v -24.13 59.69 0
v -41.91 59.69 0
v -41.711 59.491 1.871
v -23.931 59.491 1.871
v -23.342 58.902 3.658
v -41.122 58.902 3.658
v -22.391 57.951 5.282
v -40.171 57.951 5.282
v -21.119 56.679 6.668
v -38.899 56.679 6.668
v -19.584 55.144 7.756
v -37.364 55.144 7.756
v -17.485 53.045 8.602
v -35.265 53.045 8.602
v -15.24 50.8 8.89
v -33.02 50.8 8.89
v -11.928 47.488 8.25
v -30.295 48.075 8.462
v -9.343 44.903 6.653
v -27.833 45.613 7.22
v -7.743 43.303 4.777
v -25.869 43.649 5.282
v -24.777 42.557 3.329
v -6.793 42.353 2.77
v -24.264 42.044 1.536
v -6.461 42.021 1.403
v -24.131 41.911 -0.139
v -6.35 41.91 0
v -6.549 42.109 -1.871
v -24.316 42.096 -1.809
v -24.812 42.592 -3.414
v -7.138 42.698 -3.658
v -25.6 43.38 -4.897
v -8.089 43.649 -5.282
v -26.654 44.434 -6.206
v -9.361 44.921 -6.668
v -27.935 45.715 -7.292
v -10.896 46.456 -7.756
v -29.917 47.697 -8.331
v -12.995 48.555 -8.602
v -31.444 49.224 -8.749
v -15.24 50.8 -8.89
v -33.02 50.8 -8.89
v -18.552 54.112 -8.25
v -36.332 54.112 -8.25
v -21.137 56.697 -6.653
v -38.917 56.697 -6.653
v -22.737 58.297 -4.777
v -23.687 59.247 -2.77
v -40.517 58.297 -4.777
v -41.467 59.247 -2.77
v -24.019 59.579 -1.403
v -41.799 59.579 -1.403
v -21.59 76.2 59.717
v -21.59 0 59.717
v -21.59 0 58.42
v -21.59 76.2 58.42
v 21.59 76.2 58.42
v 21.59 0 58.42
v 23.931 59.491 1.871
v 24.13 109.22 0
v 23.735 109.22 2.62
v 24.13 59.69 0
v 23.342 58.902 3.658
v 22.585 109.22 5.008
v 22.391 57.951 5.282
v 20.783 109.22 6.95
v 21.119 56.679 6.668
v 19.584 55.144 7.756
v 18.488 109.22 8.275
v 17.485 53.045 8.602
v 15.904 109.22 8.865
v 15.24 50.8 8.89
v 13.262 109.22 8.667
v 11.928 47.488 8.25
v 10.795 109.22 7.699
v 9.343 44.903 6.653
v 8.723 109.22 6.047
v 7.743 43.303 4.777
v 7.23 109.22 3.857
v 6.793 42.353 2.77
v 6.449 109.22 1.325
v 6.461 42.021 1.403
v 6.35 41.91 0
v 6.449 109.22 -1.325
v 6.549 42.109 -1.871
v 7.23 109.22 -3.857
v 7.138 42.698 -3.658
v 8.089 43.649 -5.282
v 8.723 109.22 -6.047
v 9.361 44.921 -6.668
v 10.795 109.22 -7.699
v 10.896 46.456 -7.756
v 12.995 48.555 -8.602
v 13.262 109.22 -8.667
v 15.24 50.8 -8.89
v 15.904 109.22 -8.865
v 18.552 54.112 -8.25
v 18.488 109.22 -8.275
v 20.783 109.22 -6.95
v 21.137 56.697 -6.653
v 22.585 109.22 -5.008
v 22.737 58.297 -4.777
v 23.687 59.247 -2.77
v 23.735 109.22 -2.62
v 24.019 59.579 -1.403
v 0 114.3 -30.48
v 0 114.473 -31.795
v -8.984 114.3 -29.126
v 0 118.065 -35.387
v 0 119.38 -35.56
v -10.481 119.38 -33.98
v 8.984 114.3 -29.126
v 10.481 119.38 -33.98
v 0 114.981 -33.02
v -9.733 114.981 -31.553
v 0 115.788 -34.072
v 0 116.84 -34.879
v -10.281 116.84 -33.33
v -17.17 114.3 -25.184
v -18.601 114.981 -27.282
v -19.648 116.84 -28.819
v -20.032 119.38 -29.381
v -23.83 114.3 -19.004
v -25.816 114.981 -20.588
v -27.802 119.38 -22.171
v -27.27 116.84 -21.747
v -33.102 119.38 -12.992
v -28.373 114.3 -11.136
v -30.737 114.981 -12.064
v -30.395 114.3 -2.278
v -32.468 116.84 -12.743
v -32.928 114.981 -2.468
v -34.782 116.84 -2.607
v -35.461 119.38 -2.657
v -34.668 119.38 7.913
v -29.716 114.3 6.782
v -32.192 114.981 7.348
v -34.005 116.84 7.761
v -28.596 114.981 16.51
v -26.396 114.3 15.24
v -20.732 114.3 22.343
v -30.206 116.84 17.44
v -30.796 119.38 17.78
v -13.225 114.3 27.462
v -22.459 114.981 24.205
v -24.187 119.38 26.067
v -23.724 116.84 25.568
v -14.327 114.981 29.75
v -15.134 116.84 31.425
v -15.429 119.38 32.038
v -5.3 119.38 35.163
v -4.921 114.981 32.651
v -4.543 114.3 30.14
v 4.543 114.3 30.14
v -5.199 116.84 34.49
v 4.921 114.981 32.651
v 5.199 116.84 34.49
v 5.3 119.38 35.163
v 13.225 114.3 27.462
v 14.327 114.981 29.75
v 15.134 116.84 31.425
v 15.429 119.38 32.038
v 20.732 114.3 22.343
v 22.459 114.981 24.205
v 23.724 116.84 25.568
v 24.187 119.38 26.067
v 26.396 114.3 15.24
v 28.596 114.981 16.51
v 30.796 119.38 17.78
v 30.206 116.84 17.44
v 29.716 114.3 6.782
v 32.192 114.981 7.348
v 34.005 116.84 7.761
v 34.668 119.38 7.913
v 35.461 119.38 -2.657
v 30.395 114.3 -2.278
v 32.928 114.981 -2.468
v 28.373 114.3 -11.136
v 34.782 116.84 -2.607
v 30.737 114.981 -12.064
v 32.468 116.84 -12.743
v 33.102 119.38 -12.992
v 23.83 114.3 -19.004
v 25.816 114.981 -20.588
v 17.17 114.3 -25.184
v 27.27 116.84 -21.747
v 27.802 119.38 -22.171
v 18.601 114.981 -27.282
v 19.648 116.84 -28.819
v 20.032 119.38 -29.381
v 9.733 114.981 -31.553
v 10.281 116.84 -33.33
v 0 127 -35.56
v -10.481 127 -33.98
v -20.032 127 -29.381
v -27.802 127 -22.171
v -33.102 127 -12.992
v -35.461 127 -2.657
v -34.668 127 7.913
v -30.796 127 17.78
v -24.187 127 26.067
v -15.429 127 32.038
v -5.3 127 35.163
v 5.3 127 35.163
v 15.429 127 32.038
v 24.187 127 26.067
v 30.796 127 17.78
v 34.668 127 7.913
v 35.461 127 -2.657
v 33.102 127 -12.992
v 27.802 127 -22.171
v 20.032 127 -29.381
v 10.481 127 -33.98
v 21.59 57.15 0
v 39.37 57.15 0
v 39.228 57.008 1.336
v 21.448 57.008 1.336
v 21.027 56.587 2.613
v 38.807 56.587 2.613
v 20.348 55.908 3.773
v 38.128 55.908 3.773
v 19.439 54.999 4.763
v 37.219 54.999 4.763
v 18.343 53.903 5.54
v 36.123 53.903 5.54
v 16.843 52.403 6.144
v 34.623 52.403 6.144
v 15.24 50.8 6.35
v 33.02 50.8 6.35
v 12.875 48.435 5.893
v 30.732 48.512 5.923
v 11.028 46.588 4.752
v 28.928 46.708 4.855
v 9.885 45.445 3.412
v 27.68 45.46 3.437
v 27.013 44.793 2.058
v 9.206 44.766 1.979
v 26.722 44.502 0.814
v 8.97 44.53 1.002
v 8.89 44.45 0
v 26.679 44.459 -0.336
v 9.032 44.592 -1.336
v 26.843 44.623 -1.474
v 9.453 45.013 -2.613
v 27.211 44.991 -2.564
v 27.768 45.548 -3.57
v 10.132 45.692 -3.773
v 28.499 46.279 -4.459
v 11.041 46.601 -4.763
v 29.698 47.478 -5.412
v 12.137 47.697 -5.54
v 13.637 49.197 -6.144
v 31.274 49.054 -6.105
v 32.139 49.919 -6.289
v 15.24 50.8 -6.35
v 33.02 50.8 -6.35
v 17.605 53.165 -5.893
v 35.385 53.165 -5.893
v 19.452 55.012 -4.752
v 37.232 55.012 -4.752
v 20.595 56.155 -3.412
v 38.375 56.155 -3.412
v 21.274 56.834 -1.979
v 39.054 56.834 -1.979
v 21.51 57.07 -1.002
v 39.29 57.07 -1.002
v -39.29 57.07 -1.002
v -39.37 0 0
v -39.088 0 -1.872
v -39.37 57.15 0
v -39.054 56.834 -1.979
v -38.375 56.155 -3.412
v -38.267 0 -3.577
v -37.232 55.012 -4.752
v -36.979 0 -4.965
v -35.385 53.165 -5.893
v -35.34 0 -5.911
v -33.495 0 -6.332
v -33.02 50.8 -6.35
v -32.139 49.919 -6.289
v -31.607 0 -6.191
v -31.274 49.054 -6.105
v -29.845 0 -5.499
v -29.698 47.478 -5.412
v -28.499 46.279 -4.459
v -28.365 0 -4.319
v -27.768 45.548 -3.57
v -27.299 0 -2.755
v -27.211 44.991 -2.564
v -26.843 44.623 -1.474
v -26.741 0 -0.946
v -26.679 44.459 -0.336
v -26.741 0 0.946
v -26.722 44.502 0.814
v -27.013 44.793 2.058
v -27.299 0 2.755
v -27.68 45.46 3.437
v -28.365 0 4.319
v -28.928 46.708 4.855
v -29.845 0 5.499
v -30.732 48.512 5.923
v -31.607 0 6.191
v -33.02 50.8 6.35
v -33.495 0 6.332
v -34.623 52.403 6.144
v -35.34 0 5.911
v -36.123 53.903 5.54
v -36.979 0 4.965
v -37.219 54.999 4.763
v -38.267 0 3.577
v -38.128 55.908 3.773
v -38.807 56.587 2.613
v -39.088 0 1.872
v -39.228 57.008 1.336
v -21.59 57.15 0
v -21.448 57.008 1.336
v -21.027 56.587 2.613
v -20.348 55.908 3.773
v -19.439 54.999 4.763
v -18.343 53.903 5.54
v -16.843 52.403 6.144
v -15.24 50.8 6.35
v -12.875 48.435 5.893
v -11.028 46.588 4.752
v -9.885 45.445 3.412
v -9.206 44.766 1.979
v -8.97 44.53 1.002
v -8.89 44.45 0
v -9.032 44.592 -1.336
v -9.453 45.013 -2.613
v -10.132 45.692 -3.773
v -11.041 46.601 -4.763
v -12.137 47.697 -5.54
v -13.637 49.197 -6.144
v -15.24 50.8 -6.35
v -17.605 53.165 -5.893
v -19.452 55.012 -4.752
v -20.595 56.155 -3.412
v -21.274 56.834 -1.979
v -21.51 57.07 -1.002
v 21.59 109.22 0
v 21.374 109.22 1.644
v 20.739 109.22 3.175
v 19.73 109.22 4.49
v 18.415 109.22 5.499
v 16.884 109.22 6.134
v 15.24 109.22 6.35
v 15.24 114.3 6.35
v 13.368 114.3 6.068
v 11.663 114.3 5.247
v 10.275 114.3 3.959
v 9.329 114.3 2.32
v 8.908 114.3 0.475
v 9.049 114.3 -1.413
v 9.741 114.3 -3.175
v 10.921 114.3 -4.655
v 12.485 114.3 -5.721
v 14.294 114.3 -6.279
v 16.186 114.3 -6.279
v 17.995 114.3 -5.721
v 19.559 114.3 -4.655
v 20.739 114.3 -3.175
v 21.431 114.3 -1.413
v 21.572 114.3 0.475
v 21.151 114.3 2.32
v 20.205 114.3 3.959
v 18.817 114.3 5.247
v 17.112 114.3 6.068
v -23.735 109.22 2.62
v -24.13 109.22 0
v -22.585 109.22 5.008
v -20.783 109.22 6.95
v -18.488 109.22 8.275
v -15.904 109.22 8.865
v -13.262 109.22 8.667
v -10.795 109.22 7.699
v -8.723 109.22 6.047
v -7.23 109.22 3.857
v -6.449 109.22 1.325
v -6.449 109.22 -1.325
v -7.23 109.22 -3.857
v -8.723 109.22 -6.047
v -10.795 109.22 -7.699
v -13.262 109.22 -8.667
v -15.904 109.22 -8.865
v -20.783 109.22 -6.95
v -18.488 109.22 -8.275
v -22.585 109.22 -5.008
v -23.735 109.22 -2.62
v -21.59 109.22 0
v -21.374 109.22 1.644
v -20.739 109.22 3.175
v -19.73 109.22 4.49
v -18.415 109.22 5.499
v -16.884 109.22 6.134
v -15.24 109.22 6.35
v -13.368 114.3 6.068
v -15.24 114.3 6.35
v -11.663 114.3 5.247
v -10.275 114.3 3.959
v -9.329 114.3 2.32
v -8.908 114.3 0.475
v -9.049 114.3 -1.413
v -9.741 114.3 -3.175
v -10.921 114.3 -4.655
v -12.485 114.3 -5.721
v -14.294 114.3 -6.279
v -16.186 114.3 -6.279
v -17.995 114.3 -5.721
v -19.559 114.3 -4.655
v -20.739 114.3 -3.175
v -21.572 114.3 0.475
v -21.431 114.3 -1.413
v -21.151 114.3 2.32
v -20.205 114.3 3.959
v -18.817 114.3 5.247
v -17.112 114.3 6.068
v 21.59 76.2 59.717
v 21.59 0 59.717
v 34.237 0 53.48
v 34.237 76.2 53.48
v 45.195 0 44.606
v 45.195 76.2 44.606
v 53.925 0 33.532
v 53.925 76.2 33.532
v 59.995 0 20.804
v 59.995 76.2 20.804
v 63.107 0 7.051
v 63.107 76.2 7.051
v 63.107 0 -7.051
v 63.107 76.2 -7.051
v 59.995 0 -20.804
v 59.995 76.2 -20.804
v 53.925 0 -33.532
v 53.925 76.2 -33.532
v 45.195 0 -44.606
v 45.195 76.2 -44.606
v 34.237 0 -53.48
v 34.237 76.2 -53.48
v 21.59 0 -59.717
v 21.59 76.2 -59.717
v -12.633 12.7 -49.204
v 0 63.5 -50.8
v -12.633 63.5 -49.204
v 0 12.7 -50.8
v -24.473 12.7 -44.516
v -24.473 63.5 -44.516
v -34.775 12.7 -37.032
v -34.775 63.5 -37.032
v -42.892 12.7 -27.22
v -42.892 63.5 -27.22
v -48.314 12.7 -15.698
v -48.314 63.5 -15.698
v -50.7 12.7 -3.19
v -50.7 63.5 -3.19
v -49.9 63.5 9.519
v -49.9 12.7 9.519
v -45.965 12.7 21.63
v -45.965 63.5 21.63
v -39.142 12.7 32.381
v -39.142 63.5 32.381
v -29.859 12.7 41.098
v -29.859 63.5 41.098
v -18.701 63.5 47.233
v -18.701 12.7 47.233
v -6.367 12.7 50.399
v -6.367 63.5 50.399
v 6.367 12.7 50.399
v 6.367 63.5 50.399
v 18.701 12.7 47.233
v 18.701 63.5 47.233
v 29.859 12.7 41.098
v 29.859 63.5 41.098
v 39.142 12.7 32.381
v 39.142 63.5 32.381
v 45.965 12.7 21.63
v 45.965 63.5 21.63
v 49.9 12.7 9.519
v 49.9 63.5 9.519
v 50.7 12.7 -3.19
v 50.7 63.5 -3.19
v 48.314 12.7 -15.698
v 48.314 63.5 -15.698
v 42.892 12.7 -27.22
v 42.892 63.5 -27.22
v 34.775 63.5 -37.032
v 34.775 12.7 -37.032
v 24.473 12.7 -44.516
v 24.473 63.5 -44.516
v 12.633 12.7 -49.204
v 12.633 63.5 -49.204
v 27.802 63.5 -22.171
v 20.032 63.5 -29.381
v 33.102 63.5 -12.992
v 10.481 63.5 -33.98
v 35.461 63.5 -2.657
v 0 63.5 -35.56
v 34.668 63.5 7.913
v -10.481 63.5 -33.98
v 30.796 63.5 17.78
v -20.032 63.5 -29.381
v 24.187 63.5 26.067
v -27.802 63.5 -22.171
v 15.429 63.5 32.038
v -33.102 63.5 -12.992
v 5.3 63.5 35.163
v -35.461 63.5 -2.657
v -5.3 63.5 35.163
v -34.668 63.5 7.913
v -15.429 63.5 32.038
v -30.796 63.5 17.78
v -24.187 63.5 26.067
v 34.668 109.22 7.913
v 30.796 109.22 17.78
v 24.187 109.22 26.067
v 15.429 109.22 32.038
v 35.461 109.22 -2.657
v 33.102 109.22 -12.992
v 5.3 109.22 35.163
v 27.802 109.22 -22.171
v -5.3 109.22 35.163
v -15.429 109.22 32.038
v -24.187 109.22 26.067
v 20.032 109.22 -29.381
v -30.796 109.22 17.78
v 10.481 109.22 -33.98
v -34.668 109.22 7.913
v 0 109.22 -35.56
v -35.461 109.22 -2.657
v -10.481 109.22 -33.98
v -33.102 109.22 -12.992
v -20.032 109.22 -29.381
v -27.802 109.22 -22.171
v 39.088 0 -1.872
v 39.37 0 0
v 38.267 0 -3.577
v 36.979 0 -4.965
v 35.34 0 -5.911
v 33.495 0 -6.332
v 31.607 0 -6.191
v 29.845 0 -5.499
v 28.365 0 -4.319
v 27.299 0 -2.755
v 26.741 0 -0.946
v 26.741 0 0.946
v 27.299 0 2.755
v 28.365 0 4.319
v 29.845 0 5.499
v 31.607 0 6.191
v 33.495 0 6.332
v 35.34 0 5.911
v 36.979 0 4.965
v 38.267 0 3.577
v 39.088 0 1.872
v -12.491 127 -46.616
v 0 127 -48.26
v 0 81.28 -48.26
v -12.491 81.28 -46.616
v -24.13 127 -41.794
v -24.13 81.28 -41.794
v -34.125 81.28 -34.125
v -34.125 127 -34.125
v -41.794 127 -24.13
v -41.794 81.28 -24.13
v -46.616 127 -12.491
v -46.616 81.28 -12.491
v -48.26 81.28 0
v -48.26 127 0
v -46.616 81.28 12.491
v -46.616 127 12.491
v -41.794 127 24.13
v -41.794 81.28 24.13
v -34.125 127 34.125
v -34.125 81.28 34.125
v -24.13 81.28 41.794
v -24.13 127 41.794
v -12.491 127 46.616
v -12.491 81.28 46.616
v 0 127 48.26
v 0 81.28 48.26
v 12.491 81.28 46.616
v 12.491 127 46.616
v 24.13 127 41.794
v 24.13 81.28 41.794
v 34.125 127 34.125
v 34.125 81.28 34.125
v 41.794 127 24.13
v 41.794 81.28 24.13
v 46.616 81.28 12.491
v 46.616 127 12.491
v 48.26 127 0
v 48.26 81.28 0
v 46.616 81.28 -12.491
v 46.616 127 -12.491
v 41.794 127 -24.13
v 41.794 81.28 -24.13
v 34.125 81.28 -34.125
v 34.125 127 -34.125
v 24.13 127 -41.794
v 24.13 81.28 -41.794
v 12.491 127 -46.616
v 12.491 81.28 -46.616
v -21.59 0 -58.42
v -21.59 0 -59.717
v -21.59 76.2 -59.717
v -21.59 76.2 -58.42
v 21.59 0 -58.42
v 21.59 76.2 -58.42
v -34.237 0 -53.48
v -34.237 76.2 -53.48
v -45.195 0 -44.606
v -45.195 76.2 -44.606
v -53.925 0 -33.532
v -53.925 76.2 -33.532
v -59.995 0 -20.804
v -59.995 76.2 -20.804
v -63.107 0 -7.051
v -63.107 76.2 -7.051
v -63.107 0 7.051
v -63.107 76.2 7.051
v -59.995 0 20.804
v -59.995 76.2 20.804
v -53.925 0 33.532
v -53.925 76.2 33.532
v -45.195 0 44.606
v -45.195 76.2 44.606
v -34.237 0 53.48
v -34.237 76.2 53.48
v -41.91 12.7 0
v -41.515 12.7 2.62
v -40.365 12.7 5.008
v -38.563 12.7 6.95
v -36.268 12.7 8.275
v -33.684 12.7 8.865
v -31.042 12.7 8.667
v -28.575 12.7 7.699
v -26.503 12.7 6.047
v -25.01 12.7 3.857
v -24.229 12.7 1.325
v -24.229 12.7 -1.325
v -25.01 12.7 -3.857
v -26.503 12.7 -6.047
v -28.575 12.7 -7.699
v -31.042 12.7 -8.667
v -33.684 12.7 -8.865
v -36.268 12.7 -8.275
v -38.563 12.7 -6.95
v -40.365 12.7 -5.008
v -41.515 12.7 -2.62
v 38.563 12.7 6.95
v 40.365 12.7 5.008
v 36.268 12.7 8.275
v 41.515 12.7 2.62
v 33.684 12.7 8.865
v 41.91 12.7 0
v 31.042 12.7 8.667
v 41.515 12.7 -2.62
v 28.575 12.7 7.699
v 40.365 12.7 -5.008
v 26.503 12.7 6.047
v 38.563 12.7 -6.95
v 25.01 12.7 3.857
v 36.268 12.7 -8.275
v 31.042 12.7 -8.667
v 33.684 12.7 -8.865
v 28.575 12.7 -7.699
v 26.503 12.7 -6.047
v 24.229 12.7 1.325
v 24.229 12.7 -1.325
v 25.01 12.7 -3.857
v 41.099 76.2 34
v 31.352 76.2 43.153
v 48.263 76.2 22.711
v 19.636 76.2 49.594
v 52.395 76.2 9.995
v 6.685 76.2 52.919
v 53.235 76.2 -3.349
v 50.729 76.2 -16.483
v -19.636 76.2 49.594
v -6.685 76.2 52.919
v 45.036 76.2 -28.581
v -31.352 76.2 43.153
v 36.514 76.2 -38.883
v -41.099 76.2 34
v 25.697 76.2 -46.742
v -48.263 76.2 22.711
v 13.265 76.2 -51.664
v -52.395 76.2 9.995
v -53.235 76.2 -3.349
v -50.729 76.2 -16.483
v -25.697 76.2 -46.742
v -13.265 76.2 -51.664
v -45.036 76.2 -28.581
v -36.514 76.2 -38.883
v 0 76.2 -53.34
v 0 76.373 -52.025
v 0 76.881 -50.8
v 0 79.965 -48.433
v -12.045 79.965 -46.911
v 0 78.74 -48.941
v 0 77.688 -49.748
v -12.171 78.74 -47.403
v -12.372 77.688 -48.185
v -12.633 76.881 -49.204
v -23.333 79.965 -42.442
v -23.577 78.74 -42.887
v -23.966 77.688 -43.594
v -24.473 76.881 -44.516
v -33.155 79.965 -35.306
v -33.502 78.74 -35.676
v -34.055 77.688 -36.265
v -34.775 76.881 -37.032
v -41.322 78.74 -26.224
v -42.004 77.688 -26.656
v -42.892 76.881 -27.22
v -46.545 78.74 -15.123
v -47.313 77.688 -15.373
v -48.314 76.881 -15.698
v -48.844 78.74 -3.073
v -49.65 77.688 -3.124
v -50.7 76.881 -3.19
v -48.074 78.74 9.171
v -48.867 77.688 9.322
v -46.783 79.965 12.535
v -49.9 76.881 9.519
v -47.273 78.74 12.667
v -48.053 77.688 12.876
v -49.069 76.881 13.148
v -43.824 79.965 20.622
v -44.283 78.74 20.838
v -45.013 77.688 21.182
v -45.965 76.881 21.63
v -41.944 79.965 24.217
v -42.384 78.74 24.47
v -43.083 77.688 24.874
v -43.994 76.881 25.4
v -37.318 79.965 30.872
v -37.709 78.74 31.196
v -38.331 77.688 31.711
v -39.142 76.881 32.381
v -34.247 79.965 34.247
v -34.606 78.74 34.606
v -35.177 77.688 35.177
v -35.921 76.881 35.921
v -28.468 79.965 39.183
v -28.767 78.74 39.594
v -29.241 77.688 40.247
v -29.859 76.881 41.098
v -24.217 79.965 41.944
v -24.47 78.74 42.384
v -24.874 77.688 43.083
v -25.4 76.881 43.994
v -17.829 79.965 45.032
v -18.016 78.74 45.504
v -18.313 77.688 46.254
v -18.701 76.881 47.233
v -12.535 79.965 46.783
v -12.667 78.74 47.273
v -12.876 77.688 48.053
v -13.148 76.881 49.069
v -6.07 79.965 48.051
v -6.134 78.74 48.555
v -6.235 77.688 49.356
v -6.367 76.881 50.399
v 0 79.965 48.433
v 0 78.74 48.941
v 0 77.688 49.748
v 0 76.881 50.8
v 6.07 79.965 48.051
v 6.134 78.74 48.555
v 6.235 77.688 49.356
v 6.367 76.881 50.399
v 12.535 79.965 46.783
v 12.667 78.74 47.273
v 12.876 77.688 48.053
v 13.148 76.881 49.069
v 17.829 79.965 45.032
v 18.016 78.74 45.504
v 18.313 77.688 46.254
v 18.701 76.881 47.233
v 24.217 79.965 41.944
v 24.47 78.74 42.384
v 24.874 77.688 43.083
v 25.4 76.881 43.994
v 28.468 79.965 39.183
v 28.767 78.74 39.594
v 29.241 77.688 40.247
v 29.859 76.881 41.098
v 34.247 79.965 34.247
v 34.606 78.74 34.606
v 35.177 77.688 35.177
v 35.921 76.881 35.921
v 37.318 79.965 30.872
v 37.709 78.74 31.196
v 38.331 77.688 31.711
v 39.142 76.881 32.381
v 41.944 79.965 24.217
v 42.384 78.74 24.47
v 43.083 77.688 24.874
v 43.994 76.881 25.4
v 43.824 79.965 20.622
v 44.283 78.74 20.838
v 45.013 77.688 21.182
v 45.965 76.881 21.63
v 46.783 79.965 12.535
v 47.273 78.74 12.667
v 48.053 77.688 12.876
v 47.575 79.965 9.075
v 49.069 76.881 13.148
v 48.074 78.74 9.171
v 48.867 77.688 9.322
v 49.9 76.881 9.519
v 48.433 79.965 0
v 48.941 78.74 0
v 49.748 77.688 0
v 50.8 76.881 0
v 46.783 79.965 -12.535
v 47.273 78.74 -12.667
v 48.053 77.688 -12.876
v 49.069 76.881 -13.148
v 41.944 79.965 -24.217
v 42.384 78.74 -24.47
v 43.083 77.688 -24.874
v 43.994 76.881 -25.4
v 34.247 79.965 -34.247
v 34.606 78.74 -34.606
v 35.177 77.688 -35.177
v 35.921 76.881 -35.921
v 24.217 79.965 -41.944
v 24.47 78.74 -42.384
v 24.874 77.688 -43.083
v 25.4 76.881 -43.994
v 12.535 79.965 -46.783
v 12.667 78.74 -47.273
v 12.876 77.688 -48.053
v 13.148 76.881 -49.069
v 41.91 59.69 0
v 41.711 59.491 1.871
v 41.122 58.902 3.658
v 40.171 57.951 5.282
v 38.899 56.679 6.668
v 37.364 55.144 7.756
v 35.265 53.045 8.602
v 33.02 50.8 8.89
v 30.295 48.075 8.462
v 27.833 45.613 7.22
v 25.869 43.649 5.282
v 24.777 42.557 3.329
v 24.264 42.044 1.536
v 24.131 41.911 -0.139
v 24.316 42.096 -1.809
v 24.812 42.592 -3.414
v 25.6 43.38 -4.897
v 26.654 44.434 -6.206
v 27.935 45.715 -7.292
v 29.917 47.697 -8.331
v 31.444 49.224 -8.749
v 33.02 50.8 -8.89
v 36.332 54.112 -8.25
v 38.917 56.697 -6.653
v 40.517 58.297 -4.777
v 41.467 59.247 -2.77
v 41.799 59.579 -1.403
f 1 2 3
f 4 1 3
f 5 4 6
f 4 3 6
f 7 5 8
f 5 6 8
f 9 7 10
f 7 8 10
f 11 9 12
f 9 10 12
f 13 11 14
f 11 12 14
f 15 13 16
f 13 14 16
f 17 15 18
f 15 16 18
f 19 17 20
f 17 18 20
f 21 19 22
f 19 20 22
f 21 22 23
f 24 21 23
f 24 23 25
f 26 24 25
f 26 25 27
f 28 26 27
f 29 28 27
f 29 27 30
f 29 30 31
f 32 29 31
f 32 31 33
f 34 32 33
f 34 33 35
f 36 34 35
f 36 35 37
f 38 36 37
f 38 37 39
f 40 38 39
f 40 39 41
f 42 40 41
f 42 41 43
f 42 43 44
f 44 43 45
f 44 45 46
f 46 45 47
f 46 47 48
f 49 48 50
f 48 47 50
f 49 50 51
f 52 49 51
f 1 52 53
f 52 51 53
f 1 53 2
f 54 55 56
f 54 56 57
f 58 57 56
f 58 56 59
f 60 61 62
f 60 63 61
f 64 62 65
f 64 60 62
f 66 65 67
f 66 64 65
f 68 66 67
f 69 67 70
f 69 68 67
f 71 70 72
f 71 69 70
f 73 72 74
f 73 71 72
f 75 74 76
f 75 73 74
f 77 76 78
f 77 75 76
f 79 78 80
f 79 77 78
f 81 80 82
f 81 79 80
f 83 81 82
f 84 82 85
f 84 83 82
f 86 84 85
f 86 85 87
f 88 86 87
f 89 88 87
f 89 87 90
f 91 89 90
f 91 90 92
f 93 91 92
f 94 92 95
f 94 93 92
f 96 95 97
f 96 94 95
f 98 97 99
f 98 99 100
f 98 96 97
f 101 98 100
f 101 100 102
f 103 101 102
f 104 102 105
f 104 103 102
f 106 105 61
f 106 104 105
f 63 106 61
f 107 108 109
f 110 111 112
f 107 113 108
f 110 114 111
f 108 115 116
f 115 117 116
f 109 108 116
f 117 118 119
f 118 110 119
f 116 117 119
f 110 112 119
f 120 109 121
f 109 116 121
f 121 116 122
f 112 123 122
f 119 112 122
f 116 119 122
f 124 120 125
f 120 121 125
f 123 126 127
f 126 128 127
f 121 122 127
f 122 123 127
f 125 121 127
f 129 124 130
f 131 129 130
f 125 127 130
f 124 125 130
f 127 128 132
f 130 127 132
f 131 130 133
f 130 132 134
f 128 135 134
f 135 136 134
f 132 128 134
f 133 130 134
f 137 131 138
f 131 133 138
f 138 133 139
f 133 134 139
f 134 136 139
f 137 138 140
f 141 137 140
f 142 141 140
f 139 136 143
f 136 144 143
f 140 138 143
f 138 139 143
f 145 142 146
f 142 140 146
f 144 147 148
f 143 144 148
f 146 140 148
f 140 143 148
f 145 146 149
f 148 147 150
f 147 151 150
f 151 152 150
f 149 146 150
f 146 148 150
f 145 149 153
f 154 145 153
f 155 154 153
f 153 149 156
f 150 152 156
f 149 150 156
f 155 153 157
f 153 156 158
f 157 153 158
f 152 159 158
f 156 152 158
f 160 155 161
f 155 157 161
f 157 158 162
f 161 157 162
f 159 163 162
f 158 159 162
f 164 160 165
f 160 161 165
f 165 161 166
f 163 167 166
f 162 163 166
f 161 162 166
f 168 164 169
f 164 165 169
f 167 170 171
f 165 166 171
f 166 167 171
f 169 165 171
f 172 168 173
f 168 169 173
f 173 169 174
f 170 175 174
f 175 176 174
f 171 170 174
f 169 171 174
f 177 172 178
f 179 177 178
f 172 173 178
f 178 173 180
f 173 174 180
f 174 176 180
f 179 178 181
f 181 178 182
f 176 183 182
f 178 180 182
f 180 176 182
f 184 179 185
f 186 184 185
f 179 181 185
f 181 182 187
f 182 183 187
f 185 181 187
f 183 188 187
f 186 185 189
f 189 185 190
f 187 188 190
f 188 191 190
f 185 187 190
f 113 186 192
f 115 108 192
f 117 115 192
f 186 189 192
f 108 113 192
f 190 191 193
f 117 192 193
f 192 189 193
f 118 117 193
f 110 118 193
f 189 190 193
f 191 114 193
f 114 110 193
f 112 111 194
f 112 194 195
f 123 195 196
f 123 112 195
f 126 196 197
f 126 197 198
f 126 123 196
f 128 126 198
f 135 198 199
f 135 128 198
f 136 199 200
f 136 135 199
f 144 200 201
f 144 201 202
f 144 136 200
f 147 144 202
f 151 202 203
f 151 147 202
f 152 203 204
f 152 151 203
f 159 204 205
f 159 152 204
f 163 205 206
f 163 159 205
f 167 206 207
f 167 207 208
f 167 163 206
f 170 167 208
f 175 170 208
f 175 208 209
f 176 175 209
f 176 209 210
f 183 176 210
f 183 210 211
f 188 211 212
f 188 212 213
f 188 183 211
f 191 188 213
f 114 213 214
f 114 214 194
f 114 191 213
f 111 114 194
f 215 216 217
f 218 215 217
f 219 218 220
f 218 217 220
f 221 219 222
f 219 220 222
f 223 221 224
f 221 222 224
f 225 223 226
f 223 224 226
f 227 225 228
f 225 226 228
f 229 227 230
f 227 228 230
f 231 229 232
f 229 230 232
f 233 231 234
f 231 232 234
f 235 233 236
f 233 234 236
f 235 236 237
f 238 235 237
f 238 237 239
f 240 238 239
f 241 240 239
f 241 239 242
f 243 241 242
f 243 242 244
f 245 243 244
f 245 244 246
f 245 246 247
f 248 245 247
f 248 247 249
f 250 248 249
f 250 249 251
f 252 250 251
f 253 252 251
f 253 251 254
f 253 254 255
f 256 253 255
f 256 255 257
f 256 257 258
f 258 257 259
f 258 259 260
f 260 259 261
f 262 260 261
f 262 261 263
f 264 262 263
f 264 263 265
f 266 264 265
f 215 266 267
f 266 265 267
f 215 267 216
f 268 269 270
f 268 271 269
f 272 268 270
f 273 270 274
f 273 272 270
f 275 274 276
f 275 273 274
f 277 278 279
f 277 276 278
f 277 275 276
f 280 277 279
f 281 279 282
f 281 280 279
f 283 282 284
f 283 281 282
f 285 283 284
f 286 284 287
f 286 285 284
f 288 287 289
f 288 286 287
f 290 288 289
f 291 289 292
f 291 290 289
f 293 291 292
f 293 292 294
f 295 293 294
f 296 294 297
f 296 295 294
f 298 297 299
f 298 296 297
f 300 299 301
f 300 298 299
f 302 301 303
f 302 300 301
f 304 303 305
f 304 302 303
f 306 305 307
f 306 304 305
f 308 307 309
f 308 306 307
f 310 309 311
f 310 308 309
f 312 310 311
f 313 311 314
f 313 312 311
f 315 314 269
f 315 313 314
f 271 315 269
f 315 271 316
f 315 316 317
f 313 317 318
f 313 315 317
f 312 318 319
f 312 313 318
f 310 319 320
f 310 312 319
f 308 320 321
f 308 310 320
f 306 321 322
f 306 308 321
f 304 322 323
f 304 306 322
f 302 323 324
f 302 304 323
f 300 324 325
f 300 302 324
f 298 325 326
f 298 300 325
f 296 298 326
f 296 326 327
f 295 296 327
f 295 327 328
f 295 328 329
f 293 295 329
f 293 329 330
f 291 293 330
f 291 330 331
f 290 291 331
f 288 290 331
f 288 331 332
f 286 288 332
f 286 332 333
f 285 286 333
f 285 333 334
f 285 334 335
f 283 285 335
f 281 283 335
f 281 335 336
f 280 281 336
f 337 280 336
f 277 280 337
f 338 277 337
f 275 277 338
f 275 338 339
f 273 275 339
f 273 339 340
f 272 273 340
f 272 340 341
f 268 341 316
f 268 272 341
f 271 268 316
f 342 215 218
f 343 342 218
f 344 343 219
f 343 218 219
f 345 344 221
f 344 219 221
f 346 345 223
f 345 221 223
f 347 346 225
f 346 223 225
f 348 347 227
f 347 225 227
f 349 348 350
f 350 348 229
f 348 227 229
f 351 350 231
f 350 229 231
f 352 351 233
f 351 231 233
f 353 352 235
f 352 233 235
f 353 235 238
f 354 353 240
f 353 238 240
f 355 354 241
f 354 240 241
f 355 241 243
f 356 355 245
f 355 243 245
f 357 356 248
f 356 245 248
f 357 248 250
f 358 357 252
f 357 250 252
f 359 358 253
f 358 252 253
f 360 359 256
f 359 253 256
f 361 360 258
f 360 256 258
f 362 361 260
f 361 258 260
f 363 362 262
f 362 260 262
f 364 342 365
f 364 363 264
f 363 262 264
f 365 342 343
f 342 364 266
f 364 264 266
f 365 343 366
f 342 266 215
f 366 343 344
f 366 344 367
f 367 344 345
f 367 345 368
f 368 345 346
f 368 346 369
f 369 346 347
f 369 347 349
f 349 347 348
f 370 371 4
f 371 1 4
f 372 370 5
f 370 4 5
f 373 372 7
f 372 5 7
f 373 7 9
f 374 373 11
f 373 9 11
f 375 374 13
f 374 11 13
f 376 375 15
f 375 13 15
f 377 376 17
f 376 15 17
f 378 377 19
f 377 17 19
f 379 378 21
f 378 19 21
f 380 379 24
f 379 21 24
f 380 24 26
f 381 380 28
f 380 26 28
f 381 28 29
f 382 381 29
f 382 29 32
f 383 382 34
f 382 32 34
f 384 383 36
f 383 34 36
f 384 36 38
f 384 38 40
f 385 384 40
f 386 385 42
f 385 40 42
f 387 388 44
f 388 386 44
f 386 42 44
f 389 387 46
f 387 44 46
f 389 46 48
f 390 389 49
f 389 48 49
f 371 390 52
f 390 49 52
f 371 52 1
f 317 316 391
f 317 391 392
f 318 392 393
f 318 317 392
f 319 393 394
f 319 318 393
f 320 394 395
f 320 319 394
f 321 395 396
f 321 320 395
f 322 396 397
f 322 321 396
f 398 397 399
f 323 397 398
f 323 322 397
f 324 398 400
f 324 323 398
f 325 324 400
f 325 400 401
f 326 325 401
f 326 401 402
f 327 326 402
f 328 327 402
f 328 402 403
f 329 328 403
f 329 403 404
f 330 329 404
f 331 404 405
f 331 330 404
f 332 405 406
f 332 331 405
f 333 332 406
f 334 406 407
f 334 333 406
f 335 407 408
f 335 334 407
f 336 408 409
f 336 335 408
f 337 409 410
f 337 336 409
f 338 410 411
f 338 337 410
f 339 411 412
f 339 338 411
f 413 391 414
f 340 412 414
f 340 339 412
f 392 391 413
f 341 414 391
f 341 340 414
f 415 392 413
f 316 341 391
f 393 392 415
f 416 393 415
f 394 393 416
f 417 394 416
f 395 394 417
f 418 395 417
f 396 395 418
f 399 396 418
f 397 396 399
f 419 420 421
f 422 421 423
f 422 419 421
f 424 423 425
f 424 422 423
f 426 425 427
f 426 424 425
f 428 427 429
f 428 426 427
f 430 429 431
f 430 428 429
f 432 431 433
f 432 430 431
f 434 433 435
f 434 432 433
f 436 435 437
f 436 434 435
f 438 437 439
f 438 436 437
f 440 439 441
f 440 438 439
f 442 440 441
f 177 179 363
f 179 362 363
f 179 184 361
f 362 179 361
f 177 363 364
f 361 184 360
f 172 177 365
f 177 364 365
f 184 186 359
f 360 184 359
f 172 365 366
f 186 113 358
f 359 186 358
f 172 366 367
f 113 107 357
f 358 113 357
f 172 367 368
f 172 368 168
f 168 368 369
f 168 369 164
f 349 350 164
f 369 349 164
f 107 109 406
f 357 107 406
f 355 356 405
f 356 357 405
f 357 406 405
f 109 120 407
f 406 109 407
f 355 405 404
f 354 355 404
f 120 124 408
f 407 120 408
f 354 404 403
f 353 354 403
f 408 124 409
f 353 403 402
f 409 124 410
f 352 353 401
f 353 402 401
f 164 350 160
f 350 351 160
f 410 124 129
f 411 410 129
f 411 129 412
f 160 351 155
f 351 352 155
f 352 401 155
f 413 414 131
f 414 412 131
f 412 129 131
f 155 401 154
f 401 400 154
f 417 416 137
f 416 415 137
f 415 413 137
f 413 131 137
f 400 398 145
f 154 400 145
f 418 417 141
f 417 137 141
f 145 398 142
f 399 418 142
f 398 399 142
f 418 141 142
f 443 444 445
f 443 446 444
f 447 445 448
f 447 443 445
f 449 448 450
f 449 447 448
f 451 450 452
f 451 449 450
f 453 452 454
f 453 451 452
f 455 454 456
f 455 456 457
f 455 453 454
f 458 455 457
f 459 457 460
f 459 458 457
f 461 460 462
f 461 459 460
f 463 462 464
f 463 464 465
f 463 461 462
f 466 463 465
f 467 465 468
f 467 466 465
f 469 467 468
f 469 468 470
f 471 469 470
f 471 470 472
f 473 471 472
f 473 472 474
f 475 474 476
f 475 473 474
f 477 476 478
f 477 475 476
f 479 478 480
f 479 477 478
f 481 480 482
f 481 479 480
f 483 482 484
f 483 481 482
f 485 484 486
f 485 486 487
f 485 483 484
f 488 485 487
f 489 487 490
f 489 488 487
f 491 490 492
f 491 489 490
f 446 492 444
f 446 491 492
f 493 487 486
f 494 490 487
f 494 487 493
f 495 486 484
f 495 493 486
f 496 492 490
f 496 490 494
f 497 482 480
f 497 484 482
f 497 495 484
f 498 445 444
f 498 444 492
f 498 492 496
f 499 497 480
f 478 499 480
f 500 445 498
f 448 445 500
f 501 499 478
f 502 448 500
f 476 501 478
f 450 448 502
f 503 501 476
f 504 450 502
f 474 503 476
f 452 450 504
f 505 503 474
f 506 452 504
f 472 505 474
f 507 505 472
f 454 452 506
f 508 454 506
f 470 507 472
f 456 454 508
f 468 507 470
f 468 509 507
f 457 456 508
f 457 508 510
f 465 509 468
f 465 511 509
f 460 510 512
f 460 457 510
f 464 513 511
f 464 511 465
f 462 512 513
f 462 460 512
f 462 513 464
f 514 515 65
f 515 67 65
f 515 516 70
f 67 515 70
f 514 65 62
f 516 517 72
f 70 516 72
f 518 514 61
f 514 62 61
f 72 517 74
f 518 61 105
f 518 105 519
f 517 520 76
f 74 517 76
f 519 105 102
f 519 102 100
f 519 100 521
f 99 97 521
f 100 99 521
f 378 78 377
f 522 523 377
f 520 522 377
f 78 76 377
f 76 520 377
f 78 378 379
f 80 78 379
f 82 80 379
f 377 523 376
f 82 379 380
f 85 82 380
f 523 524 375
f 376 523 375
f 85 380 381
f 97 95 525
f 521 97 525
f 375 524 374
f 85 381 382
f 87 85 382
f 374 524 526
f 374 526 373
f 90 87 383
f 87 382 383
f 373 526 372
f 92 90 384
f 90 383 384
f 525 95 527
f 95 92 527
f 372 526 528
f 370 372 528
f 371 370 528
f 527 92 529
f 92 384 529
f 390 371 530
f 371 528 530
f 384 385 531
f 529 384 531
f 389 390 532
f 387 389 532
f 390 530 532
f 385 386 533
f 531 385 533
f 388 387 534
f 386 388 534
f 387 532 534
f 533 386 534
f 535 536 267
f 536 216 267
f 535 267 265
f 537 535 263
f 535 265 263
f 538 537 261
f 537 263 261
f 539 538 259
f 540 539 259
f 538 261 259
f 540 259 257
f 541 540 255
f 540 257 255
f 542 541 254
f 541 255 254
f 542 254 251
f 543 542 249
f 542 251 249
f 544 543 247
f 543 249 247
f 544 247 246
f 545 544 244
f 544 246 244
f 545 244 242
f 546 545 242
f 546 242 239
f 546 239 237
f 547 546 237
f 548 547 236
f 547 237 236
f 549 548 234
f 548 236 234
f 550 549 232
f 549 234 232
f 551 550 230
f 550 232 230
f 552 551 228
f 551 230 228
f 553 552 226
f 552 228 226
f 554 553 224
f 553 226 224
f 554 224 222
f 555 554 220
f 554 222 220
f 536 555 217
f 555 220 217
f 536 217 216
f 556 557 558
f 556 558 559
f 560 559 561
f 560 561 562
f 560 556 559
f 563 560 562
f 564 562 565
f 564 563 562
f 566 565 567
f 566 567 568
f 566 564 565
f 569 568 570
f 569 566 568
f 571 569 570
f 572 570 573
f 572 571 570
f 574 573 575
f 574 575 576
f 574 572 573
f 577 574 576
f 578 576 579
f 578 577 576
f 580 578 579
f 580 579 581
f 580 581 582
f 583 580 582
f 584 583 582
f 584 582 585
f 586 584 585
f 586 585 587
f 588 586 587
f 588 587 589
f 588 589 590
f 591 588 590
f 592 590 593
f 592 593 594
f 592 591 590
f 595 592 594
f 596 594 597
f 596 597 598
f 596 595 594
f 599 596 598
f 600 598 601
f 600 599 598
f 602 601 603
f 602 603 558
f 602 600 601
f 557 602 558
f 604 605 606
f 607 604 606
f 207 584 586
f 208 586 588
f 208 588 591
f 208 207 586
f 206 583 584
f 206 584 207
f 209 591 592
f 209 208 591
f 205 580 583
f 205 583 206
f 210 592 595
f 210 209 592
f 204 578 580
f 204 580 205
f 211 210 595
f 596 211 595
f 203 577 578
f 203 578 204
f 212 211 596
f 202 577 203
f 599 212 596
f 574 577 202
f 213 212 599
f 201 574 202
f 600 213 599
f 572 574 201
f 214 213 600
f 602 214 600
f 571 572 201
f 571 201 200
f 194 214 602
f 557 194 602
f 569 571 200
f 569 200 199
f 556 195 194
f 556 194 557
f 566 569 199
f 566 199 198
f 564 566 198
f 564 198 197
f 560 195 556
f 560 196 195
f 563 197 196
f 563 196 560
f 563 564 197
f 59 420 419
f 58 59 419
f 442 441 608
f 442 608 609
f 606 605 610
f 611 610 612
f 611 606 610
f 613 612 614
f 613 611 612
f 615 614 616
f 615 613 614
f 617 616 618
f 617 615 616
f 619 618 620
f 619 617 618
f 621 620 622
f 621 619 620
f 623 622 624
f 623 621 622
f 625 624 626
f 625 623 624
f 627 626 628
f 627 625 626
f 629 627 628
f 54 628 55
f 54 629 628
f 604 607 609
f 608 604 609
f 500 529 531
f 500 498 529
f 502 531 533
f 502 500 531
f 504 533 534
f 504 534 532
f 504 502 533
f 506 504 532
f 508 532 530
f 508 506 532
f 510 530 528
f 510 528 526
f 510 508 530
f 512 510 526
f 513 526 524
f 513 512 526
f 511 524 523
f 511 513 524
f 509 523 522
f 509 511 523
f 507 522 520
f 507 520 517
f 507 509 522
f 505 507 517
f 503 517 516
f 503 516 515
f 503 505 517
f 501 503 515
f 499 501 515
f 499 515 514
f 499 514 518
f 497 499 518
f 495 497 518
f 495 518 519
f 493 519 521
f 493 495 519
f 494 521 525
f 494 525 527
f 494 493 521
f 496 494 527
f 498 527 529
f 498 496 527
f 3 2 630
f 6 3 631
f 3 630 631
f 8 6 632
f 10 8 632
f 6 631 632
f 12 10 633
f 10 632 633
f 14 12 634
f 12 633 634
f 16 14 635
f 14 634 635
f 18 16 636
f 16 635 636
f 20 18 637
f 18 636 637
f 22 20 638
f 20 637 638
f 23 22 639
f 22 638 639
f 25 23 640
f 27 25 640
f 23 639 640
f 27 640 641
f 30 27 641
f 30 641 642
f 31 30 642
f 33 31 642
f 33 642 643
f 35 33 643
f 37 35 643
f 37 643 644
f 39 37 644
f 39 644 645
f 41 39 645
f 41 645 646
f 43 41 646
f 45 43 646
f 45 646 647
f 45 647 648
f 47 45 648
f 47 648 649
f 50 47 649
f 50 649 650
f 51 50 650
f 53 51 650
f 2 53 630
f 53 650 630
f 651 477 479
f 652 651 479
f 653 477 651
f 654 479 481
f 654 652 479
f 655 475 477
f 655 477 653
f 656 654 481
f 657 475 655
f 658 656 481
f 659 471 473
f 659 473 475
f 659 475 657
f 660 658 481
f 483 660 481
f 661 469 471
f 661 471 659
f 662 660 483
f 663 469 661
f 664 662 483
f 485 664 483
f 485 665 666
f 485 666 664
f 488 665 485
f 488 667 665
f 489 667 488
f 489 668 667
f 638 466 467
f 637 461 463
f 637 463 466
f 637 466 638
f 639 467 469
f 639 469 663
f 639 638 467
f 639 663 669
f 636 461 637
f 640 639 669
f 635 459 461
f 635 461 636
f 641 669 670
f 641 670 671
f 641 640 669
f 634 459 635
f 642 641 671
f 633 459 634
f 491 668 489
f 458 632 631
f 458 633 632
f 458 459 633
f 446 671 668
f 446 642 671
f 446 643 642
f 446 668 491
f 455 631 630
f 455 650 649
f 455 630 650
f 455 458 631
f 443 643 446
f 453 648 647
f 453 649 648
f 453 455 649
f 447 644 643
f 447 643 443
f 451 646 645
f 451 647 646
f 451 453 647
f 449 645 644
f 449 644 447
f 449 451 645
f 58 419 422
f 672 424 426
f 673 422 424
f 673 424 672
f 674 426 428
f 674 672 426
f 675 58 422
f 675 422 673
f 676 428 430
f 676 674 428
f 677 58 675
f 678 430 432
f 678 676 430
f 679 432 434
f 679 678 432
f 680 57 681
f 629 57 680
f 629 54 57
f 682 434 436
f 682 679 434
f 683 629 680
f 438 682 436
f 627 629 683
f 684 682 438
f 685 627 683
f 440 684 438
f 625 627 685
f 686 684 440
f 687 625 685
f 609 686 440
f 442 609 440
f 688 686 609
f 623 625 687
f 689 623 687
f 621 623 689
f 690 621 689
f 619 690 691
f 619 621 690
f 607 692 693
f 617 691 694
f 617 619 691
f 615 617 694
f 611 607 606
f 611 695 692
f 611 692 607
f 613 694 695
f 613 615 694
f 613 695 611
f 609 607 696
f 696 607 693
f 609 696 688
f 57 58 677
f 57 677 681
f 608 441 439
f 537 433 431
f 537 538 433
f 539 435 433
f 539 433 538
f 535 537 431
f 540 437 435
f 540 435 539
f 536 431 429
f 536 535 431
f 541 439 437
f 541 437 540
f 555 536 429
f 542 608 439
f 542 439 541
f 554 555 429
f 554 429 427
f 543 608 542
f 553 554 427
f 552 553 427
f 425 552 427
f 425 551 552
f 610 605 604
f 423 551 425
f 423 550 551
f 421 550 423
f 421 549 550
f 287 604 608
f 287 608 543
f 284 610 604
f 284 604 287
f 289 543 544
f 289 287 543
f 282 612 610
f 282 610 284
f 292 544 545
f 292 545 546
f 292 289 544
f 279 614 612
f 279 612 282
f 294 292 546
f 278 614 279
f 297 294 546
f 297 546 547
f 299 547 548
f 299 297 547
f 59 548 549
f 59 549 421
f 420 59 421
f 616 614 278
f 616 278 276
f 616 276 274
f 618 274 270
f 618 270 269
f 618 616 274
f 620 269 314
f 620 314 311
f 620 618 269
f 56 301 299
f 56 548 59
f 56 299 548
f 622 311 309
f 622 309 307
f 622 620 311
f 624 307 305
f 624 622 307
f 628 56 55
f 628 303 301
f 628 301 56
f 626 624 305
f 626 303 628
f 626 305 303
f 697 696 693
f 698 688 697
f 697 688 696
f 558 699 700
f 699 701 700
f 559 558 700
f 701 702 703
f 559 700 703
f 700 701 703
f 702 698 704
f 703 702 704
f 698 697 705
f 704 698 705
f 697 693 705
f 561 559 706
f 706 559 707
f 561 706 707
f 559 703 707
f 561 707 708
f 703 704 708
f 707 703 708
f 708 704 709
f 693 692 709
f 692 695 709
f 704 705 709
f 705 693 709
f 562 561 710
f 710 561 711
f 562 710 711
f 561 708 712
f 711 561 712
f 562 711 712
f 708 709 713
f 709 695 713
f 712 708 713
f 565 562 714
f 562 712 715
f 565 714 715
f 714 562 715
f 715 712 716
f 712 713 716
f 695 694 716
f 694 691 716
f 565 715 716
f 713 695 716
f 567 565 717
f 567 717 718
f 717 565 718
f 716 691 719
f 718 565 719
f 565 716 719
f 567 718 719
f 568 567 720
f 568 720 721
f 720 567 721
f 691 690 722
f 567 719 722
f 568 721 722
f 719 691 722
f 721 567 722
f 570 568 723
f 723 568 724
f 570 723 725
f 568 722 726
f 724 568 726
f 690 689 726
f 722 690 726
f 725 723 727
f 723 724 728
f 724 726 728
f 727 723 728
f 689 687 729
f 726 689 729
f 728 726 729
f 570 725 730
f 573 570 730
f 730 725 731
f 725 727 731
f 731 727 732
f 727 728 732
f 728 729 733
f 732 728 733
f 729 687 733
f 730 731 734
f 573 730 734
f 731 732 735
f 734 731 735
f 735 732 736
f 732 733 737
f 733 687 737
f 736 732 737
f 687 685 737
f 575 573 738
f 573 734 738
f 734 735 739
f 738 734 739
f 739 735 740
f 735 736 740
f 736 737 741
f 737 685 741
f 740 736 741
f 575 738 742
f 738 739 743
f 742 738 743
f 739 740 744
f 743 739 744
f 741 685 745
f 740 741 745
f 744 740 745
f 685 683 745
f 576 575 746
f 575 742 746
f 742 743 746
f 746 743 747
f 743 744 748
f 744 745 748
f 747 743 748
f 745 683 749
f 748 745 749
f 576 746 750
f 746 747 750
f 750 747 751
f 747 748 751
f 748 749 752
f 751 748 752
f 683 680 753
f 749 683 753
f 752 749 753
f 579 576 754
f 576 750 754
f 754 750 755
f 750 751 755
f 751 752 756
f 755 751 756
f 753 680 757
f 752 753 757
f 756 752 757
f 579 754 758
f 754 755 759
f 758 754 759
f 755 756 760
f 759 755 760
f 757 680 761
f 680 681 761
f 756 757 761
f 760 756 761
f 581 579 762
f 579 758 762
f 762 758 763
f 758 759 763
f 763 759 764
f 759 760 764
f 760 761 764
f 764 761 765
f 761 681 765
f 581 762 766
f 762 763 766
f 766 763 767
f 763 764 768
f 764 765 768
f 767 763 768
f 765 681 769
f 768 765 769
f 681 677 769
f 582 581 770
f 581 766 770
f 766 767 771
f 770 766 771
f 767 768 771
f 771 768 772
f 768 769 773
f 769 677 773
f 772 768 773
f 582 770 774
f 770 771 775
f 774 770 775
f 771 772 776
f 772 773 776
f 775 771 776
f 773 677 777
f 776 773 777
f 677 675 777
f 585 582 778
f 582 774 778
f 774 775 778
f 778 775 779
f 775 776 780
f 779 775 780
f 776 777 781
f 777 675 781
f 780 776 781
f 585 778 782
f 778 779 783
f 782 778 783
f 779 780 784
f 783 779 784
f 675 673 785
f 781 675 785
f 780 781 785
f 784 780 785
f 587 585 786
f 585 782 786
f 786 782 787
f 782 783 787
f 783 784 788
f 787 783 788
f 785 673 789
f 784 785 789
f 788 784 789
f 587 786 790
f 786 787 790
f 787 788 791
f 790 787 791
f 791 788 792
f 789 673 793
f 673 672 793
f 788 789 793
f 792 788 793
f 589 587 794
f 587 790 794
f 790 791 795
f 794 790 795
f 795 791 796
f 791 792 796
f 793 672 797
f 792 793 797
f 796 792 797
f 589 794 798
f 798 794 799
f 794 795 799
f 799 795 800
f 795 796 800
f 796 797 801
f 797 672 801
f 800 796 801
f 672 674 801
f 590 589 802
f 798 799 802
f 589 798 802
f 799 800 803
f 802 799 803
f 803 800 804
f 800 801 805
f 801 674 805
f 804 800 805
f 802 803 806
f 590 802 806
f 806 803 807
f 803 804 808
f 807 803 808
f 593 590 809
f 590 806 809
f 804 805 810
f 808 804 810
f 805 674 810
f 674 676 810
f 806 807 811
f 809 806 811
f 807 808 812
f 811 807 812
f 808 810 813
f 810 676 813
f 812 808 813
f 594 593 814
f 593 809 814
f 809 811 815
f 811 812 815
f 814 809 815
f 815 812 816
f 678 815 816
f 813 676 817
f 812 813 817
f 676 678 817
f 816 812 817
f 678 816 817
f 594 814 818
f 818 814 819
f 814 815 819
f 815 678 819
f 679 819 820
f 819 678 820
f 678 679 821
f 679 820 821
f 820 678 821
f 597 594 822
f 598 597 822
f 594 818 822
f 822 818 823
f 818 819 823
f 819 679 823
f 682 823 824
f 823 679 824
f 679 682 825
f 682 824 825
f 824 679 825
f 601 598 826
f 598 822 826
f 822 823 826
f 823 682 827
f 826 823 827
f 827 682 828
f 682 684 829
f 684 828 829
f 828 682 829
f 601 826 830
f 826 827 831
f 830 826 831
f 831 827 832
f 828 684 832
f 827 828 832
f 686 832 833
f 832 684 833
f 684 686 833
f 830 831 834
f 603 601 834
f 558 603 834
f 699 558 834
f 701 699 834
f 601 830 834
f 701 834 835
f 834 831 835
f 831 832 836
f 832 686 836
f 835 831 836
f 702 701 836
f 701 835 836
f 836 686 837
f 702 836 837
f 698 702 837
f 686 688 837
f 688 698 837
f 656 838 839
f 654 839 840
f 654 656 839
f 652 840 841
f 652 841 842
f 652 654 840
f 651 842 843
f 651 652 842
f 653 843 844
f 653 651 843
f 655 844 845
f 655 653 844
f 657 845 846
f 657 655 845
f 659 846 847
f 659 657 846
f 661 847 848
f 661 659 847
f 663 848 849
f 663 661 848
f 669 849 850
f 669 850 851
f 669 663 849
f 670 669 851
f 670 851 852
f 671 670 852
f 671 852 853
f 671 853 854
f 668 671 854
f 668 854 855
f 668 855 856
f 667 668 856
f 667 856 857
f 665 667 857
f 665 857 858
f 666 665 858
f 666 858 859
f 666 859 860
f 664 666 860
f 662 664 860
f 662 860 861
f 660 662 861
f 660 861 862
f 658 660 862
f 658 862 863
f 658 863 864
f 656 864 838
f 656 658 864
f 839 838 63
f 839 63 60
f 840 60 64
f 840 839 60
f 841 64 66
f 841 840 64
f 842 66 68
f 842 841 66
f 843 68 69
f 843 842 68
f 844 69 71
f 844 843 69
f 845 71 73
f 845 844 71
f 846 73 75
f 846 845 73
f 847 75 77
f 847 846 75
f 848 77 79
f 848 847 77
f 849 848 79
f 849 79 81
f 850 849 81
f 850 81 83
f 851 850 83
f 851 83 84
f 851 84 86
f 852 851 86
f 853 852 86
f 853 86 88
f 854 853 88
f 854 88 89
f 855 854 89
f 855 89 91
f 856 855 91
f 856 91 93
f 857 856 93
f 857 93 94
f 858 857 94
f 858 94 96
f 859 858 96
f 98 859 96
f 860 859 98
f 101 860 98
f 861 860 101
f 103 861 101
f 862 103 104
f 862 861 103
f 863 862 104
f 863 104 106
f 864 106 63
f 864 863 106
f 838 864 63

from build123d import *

# Parameters (mm, degrees)
BOSS_EXTRUDE1_START = -5.08
SKETCH2_R           = 35.56
BOSS_EXTRUDE1_DEPTH = 5.08
SKETCH3_R           = 8.89
SKETCH3_R_2         = 6.35
SKETCH5_R           = 6.35
CUT_EXTRUDE1_DEPTH  = 146.358143907
SKETCH6_R           = 6.35
CUT_EXTRUDE2_DEPTH  = 142.398403103
SKETCH7_W           = 43.18
SKETCH7_H           = 76.2
CUT_EXTRUDE3_DEPTH  = 5.08
FILLET1_R           = 5.08


with BuildPart() as part:
    # Sketch1 → Revolve1 (revolve)
    with BuildSketch(Plane.XY, mode=Mode.PRIVATE) as revolve1_sk:
        Polygon((0, 0), (63.5, 0), (63.5, 76.2), (48.26, 76.2), (48.26, 127), (35.56, 127), (35.56, 63.5), (50.8, 63.5), (50.8, 12.7), (0, 12.7), align=None)
    revolve(revolve1_sk.sketch.rotate(Axis((0, 0, 0), (0, 1, 0)), 90), axis=Axis((0, 0, 0), (0, 1, 0)))

    # Sketch2 → Boss-Extrude1 (add)
    with BuildSketch(Plane(origin=(0, 114.3, 0), x_dir=(1, 0, 0), z_dir=(0, 1, 0)).offset(BOSS_EXTRUDE1_START)):
        with Locations(Location((0, 0, 0), (0, 0, 90))):
            Circle(SKETCH2_R)
    extrude(amount=BOSS_EXTRUDE1_DEPTH)

    # Sweep1: sweep along a path in Sketch4
    with BuildLine(Plane.XY) as sweep1_path:
        Line((15.24, 114.3), (15.24, 50.8))
        Line((15.24, 50.8), (33.02, 50.8))
        Line((33.02, 50.8), (33.02, 12.7))
    # Sketch3 → Sweep1 (sweep)
    with BuildSketch(Plane(origin=(0, 114.3, 0), x_dir=(1, 0, 0), z_dir=(0, 1, 0))):
        with Locations((15.24, 0)):
            Circle(SKETCH3_R)
        with Locations((15.24, 0)):
            Circle(SKETCH3_R_2, mode=Mode.SUBTRACT)
    sweep1 = sweep(path=sweep1_path.line, transition=Transition.RIGHT)

    # Sketch5 → Cut-Extrude1 (cut, through all)
    with BuildSketch(Plane(origin=(0, 12.7, 0), x_dir=(1, 0, 0), z_dir=(0, 1, 0))):
        with Locations((33.02, 0)):
            Circle(SKETCH5_R)
    cut_extrude1 = extrude(amount=-CUT_EXTRUDE1_DEPTH, mode=Mode.SUBTRACT)

    # Sketch6 → Cut-Extrude2 (cut, through all)
    with BuildSketch(Plane.XZ.offset(-109.22)):
        with Locations(Location((15.24, 0, 0), (0, 0, 90))):
            Circle(SKETCH6_R)
    cut_extrude2 = extrude(amount=-CUT_EXTRUDE2_DEPTH, mode=Mode.SUBTRACT)

    # Mirror1: Sweep1, Cut-Extrude1, Cut-Extrude2 across plane
    add(sweep1.mirror(Plane(origin=(0, 0, 0), x_dir=(0, 0, 1), z_dir=(1, 0, 0))))
    add(cut_extrude1.mirror(Plane(origin=(0, 0, 0), x_dir=(0, 0, 1), z_dir=(1, 0, 0))), mode=Mode.SUBTRACT)
    add(cut_extrude2.mirror(Plane(origin=(0, 0, 0), x_dir=(0, 0, 1), z_dir=(1, 0, 0))), mode=Mode.SUBTRACT)

    # Sketch7 → Cut-Extrude3 (cut)
    with BuildSketch(Plane.XY.offset(63.5)):
        with Locations((0, 38.1)):
            Rectangle(SKETCH7_W, SKETCH7_H)
    cut_extrude3 = extrude(amount=-CUT_EXTRUDE3_DEPTH, mode=Mode.SUBTRACT)

    # Mirror2: Cut-Extrude3 across plane
    add(cut_extrude3.mirror(Plane.XY), mode=Mode.SUBTRACT)

    # Fillet1
    fillet1_edges = [part.edges().sort_by_distance(p)[0] for p in [
        (0, 76.2, 48.26),
        (0, 114.3, 35.56),
    ]]
    fillet(fillet1_edges, radius=FILLET1_R)


solid = part.part
